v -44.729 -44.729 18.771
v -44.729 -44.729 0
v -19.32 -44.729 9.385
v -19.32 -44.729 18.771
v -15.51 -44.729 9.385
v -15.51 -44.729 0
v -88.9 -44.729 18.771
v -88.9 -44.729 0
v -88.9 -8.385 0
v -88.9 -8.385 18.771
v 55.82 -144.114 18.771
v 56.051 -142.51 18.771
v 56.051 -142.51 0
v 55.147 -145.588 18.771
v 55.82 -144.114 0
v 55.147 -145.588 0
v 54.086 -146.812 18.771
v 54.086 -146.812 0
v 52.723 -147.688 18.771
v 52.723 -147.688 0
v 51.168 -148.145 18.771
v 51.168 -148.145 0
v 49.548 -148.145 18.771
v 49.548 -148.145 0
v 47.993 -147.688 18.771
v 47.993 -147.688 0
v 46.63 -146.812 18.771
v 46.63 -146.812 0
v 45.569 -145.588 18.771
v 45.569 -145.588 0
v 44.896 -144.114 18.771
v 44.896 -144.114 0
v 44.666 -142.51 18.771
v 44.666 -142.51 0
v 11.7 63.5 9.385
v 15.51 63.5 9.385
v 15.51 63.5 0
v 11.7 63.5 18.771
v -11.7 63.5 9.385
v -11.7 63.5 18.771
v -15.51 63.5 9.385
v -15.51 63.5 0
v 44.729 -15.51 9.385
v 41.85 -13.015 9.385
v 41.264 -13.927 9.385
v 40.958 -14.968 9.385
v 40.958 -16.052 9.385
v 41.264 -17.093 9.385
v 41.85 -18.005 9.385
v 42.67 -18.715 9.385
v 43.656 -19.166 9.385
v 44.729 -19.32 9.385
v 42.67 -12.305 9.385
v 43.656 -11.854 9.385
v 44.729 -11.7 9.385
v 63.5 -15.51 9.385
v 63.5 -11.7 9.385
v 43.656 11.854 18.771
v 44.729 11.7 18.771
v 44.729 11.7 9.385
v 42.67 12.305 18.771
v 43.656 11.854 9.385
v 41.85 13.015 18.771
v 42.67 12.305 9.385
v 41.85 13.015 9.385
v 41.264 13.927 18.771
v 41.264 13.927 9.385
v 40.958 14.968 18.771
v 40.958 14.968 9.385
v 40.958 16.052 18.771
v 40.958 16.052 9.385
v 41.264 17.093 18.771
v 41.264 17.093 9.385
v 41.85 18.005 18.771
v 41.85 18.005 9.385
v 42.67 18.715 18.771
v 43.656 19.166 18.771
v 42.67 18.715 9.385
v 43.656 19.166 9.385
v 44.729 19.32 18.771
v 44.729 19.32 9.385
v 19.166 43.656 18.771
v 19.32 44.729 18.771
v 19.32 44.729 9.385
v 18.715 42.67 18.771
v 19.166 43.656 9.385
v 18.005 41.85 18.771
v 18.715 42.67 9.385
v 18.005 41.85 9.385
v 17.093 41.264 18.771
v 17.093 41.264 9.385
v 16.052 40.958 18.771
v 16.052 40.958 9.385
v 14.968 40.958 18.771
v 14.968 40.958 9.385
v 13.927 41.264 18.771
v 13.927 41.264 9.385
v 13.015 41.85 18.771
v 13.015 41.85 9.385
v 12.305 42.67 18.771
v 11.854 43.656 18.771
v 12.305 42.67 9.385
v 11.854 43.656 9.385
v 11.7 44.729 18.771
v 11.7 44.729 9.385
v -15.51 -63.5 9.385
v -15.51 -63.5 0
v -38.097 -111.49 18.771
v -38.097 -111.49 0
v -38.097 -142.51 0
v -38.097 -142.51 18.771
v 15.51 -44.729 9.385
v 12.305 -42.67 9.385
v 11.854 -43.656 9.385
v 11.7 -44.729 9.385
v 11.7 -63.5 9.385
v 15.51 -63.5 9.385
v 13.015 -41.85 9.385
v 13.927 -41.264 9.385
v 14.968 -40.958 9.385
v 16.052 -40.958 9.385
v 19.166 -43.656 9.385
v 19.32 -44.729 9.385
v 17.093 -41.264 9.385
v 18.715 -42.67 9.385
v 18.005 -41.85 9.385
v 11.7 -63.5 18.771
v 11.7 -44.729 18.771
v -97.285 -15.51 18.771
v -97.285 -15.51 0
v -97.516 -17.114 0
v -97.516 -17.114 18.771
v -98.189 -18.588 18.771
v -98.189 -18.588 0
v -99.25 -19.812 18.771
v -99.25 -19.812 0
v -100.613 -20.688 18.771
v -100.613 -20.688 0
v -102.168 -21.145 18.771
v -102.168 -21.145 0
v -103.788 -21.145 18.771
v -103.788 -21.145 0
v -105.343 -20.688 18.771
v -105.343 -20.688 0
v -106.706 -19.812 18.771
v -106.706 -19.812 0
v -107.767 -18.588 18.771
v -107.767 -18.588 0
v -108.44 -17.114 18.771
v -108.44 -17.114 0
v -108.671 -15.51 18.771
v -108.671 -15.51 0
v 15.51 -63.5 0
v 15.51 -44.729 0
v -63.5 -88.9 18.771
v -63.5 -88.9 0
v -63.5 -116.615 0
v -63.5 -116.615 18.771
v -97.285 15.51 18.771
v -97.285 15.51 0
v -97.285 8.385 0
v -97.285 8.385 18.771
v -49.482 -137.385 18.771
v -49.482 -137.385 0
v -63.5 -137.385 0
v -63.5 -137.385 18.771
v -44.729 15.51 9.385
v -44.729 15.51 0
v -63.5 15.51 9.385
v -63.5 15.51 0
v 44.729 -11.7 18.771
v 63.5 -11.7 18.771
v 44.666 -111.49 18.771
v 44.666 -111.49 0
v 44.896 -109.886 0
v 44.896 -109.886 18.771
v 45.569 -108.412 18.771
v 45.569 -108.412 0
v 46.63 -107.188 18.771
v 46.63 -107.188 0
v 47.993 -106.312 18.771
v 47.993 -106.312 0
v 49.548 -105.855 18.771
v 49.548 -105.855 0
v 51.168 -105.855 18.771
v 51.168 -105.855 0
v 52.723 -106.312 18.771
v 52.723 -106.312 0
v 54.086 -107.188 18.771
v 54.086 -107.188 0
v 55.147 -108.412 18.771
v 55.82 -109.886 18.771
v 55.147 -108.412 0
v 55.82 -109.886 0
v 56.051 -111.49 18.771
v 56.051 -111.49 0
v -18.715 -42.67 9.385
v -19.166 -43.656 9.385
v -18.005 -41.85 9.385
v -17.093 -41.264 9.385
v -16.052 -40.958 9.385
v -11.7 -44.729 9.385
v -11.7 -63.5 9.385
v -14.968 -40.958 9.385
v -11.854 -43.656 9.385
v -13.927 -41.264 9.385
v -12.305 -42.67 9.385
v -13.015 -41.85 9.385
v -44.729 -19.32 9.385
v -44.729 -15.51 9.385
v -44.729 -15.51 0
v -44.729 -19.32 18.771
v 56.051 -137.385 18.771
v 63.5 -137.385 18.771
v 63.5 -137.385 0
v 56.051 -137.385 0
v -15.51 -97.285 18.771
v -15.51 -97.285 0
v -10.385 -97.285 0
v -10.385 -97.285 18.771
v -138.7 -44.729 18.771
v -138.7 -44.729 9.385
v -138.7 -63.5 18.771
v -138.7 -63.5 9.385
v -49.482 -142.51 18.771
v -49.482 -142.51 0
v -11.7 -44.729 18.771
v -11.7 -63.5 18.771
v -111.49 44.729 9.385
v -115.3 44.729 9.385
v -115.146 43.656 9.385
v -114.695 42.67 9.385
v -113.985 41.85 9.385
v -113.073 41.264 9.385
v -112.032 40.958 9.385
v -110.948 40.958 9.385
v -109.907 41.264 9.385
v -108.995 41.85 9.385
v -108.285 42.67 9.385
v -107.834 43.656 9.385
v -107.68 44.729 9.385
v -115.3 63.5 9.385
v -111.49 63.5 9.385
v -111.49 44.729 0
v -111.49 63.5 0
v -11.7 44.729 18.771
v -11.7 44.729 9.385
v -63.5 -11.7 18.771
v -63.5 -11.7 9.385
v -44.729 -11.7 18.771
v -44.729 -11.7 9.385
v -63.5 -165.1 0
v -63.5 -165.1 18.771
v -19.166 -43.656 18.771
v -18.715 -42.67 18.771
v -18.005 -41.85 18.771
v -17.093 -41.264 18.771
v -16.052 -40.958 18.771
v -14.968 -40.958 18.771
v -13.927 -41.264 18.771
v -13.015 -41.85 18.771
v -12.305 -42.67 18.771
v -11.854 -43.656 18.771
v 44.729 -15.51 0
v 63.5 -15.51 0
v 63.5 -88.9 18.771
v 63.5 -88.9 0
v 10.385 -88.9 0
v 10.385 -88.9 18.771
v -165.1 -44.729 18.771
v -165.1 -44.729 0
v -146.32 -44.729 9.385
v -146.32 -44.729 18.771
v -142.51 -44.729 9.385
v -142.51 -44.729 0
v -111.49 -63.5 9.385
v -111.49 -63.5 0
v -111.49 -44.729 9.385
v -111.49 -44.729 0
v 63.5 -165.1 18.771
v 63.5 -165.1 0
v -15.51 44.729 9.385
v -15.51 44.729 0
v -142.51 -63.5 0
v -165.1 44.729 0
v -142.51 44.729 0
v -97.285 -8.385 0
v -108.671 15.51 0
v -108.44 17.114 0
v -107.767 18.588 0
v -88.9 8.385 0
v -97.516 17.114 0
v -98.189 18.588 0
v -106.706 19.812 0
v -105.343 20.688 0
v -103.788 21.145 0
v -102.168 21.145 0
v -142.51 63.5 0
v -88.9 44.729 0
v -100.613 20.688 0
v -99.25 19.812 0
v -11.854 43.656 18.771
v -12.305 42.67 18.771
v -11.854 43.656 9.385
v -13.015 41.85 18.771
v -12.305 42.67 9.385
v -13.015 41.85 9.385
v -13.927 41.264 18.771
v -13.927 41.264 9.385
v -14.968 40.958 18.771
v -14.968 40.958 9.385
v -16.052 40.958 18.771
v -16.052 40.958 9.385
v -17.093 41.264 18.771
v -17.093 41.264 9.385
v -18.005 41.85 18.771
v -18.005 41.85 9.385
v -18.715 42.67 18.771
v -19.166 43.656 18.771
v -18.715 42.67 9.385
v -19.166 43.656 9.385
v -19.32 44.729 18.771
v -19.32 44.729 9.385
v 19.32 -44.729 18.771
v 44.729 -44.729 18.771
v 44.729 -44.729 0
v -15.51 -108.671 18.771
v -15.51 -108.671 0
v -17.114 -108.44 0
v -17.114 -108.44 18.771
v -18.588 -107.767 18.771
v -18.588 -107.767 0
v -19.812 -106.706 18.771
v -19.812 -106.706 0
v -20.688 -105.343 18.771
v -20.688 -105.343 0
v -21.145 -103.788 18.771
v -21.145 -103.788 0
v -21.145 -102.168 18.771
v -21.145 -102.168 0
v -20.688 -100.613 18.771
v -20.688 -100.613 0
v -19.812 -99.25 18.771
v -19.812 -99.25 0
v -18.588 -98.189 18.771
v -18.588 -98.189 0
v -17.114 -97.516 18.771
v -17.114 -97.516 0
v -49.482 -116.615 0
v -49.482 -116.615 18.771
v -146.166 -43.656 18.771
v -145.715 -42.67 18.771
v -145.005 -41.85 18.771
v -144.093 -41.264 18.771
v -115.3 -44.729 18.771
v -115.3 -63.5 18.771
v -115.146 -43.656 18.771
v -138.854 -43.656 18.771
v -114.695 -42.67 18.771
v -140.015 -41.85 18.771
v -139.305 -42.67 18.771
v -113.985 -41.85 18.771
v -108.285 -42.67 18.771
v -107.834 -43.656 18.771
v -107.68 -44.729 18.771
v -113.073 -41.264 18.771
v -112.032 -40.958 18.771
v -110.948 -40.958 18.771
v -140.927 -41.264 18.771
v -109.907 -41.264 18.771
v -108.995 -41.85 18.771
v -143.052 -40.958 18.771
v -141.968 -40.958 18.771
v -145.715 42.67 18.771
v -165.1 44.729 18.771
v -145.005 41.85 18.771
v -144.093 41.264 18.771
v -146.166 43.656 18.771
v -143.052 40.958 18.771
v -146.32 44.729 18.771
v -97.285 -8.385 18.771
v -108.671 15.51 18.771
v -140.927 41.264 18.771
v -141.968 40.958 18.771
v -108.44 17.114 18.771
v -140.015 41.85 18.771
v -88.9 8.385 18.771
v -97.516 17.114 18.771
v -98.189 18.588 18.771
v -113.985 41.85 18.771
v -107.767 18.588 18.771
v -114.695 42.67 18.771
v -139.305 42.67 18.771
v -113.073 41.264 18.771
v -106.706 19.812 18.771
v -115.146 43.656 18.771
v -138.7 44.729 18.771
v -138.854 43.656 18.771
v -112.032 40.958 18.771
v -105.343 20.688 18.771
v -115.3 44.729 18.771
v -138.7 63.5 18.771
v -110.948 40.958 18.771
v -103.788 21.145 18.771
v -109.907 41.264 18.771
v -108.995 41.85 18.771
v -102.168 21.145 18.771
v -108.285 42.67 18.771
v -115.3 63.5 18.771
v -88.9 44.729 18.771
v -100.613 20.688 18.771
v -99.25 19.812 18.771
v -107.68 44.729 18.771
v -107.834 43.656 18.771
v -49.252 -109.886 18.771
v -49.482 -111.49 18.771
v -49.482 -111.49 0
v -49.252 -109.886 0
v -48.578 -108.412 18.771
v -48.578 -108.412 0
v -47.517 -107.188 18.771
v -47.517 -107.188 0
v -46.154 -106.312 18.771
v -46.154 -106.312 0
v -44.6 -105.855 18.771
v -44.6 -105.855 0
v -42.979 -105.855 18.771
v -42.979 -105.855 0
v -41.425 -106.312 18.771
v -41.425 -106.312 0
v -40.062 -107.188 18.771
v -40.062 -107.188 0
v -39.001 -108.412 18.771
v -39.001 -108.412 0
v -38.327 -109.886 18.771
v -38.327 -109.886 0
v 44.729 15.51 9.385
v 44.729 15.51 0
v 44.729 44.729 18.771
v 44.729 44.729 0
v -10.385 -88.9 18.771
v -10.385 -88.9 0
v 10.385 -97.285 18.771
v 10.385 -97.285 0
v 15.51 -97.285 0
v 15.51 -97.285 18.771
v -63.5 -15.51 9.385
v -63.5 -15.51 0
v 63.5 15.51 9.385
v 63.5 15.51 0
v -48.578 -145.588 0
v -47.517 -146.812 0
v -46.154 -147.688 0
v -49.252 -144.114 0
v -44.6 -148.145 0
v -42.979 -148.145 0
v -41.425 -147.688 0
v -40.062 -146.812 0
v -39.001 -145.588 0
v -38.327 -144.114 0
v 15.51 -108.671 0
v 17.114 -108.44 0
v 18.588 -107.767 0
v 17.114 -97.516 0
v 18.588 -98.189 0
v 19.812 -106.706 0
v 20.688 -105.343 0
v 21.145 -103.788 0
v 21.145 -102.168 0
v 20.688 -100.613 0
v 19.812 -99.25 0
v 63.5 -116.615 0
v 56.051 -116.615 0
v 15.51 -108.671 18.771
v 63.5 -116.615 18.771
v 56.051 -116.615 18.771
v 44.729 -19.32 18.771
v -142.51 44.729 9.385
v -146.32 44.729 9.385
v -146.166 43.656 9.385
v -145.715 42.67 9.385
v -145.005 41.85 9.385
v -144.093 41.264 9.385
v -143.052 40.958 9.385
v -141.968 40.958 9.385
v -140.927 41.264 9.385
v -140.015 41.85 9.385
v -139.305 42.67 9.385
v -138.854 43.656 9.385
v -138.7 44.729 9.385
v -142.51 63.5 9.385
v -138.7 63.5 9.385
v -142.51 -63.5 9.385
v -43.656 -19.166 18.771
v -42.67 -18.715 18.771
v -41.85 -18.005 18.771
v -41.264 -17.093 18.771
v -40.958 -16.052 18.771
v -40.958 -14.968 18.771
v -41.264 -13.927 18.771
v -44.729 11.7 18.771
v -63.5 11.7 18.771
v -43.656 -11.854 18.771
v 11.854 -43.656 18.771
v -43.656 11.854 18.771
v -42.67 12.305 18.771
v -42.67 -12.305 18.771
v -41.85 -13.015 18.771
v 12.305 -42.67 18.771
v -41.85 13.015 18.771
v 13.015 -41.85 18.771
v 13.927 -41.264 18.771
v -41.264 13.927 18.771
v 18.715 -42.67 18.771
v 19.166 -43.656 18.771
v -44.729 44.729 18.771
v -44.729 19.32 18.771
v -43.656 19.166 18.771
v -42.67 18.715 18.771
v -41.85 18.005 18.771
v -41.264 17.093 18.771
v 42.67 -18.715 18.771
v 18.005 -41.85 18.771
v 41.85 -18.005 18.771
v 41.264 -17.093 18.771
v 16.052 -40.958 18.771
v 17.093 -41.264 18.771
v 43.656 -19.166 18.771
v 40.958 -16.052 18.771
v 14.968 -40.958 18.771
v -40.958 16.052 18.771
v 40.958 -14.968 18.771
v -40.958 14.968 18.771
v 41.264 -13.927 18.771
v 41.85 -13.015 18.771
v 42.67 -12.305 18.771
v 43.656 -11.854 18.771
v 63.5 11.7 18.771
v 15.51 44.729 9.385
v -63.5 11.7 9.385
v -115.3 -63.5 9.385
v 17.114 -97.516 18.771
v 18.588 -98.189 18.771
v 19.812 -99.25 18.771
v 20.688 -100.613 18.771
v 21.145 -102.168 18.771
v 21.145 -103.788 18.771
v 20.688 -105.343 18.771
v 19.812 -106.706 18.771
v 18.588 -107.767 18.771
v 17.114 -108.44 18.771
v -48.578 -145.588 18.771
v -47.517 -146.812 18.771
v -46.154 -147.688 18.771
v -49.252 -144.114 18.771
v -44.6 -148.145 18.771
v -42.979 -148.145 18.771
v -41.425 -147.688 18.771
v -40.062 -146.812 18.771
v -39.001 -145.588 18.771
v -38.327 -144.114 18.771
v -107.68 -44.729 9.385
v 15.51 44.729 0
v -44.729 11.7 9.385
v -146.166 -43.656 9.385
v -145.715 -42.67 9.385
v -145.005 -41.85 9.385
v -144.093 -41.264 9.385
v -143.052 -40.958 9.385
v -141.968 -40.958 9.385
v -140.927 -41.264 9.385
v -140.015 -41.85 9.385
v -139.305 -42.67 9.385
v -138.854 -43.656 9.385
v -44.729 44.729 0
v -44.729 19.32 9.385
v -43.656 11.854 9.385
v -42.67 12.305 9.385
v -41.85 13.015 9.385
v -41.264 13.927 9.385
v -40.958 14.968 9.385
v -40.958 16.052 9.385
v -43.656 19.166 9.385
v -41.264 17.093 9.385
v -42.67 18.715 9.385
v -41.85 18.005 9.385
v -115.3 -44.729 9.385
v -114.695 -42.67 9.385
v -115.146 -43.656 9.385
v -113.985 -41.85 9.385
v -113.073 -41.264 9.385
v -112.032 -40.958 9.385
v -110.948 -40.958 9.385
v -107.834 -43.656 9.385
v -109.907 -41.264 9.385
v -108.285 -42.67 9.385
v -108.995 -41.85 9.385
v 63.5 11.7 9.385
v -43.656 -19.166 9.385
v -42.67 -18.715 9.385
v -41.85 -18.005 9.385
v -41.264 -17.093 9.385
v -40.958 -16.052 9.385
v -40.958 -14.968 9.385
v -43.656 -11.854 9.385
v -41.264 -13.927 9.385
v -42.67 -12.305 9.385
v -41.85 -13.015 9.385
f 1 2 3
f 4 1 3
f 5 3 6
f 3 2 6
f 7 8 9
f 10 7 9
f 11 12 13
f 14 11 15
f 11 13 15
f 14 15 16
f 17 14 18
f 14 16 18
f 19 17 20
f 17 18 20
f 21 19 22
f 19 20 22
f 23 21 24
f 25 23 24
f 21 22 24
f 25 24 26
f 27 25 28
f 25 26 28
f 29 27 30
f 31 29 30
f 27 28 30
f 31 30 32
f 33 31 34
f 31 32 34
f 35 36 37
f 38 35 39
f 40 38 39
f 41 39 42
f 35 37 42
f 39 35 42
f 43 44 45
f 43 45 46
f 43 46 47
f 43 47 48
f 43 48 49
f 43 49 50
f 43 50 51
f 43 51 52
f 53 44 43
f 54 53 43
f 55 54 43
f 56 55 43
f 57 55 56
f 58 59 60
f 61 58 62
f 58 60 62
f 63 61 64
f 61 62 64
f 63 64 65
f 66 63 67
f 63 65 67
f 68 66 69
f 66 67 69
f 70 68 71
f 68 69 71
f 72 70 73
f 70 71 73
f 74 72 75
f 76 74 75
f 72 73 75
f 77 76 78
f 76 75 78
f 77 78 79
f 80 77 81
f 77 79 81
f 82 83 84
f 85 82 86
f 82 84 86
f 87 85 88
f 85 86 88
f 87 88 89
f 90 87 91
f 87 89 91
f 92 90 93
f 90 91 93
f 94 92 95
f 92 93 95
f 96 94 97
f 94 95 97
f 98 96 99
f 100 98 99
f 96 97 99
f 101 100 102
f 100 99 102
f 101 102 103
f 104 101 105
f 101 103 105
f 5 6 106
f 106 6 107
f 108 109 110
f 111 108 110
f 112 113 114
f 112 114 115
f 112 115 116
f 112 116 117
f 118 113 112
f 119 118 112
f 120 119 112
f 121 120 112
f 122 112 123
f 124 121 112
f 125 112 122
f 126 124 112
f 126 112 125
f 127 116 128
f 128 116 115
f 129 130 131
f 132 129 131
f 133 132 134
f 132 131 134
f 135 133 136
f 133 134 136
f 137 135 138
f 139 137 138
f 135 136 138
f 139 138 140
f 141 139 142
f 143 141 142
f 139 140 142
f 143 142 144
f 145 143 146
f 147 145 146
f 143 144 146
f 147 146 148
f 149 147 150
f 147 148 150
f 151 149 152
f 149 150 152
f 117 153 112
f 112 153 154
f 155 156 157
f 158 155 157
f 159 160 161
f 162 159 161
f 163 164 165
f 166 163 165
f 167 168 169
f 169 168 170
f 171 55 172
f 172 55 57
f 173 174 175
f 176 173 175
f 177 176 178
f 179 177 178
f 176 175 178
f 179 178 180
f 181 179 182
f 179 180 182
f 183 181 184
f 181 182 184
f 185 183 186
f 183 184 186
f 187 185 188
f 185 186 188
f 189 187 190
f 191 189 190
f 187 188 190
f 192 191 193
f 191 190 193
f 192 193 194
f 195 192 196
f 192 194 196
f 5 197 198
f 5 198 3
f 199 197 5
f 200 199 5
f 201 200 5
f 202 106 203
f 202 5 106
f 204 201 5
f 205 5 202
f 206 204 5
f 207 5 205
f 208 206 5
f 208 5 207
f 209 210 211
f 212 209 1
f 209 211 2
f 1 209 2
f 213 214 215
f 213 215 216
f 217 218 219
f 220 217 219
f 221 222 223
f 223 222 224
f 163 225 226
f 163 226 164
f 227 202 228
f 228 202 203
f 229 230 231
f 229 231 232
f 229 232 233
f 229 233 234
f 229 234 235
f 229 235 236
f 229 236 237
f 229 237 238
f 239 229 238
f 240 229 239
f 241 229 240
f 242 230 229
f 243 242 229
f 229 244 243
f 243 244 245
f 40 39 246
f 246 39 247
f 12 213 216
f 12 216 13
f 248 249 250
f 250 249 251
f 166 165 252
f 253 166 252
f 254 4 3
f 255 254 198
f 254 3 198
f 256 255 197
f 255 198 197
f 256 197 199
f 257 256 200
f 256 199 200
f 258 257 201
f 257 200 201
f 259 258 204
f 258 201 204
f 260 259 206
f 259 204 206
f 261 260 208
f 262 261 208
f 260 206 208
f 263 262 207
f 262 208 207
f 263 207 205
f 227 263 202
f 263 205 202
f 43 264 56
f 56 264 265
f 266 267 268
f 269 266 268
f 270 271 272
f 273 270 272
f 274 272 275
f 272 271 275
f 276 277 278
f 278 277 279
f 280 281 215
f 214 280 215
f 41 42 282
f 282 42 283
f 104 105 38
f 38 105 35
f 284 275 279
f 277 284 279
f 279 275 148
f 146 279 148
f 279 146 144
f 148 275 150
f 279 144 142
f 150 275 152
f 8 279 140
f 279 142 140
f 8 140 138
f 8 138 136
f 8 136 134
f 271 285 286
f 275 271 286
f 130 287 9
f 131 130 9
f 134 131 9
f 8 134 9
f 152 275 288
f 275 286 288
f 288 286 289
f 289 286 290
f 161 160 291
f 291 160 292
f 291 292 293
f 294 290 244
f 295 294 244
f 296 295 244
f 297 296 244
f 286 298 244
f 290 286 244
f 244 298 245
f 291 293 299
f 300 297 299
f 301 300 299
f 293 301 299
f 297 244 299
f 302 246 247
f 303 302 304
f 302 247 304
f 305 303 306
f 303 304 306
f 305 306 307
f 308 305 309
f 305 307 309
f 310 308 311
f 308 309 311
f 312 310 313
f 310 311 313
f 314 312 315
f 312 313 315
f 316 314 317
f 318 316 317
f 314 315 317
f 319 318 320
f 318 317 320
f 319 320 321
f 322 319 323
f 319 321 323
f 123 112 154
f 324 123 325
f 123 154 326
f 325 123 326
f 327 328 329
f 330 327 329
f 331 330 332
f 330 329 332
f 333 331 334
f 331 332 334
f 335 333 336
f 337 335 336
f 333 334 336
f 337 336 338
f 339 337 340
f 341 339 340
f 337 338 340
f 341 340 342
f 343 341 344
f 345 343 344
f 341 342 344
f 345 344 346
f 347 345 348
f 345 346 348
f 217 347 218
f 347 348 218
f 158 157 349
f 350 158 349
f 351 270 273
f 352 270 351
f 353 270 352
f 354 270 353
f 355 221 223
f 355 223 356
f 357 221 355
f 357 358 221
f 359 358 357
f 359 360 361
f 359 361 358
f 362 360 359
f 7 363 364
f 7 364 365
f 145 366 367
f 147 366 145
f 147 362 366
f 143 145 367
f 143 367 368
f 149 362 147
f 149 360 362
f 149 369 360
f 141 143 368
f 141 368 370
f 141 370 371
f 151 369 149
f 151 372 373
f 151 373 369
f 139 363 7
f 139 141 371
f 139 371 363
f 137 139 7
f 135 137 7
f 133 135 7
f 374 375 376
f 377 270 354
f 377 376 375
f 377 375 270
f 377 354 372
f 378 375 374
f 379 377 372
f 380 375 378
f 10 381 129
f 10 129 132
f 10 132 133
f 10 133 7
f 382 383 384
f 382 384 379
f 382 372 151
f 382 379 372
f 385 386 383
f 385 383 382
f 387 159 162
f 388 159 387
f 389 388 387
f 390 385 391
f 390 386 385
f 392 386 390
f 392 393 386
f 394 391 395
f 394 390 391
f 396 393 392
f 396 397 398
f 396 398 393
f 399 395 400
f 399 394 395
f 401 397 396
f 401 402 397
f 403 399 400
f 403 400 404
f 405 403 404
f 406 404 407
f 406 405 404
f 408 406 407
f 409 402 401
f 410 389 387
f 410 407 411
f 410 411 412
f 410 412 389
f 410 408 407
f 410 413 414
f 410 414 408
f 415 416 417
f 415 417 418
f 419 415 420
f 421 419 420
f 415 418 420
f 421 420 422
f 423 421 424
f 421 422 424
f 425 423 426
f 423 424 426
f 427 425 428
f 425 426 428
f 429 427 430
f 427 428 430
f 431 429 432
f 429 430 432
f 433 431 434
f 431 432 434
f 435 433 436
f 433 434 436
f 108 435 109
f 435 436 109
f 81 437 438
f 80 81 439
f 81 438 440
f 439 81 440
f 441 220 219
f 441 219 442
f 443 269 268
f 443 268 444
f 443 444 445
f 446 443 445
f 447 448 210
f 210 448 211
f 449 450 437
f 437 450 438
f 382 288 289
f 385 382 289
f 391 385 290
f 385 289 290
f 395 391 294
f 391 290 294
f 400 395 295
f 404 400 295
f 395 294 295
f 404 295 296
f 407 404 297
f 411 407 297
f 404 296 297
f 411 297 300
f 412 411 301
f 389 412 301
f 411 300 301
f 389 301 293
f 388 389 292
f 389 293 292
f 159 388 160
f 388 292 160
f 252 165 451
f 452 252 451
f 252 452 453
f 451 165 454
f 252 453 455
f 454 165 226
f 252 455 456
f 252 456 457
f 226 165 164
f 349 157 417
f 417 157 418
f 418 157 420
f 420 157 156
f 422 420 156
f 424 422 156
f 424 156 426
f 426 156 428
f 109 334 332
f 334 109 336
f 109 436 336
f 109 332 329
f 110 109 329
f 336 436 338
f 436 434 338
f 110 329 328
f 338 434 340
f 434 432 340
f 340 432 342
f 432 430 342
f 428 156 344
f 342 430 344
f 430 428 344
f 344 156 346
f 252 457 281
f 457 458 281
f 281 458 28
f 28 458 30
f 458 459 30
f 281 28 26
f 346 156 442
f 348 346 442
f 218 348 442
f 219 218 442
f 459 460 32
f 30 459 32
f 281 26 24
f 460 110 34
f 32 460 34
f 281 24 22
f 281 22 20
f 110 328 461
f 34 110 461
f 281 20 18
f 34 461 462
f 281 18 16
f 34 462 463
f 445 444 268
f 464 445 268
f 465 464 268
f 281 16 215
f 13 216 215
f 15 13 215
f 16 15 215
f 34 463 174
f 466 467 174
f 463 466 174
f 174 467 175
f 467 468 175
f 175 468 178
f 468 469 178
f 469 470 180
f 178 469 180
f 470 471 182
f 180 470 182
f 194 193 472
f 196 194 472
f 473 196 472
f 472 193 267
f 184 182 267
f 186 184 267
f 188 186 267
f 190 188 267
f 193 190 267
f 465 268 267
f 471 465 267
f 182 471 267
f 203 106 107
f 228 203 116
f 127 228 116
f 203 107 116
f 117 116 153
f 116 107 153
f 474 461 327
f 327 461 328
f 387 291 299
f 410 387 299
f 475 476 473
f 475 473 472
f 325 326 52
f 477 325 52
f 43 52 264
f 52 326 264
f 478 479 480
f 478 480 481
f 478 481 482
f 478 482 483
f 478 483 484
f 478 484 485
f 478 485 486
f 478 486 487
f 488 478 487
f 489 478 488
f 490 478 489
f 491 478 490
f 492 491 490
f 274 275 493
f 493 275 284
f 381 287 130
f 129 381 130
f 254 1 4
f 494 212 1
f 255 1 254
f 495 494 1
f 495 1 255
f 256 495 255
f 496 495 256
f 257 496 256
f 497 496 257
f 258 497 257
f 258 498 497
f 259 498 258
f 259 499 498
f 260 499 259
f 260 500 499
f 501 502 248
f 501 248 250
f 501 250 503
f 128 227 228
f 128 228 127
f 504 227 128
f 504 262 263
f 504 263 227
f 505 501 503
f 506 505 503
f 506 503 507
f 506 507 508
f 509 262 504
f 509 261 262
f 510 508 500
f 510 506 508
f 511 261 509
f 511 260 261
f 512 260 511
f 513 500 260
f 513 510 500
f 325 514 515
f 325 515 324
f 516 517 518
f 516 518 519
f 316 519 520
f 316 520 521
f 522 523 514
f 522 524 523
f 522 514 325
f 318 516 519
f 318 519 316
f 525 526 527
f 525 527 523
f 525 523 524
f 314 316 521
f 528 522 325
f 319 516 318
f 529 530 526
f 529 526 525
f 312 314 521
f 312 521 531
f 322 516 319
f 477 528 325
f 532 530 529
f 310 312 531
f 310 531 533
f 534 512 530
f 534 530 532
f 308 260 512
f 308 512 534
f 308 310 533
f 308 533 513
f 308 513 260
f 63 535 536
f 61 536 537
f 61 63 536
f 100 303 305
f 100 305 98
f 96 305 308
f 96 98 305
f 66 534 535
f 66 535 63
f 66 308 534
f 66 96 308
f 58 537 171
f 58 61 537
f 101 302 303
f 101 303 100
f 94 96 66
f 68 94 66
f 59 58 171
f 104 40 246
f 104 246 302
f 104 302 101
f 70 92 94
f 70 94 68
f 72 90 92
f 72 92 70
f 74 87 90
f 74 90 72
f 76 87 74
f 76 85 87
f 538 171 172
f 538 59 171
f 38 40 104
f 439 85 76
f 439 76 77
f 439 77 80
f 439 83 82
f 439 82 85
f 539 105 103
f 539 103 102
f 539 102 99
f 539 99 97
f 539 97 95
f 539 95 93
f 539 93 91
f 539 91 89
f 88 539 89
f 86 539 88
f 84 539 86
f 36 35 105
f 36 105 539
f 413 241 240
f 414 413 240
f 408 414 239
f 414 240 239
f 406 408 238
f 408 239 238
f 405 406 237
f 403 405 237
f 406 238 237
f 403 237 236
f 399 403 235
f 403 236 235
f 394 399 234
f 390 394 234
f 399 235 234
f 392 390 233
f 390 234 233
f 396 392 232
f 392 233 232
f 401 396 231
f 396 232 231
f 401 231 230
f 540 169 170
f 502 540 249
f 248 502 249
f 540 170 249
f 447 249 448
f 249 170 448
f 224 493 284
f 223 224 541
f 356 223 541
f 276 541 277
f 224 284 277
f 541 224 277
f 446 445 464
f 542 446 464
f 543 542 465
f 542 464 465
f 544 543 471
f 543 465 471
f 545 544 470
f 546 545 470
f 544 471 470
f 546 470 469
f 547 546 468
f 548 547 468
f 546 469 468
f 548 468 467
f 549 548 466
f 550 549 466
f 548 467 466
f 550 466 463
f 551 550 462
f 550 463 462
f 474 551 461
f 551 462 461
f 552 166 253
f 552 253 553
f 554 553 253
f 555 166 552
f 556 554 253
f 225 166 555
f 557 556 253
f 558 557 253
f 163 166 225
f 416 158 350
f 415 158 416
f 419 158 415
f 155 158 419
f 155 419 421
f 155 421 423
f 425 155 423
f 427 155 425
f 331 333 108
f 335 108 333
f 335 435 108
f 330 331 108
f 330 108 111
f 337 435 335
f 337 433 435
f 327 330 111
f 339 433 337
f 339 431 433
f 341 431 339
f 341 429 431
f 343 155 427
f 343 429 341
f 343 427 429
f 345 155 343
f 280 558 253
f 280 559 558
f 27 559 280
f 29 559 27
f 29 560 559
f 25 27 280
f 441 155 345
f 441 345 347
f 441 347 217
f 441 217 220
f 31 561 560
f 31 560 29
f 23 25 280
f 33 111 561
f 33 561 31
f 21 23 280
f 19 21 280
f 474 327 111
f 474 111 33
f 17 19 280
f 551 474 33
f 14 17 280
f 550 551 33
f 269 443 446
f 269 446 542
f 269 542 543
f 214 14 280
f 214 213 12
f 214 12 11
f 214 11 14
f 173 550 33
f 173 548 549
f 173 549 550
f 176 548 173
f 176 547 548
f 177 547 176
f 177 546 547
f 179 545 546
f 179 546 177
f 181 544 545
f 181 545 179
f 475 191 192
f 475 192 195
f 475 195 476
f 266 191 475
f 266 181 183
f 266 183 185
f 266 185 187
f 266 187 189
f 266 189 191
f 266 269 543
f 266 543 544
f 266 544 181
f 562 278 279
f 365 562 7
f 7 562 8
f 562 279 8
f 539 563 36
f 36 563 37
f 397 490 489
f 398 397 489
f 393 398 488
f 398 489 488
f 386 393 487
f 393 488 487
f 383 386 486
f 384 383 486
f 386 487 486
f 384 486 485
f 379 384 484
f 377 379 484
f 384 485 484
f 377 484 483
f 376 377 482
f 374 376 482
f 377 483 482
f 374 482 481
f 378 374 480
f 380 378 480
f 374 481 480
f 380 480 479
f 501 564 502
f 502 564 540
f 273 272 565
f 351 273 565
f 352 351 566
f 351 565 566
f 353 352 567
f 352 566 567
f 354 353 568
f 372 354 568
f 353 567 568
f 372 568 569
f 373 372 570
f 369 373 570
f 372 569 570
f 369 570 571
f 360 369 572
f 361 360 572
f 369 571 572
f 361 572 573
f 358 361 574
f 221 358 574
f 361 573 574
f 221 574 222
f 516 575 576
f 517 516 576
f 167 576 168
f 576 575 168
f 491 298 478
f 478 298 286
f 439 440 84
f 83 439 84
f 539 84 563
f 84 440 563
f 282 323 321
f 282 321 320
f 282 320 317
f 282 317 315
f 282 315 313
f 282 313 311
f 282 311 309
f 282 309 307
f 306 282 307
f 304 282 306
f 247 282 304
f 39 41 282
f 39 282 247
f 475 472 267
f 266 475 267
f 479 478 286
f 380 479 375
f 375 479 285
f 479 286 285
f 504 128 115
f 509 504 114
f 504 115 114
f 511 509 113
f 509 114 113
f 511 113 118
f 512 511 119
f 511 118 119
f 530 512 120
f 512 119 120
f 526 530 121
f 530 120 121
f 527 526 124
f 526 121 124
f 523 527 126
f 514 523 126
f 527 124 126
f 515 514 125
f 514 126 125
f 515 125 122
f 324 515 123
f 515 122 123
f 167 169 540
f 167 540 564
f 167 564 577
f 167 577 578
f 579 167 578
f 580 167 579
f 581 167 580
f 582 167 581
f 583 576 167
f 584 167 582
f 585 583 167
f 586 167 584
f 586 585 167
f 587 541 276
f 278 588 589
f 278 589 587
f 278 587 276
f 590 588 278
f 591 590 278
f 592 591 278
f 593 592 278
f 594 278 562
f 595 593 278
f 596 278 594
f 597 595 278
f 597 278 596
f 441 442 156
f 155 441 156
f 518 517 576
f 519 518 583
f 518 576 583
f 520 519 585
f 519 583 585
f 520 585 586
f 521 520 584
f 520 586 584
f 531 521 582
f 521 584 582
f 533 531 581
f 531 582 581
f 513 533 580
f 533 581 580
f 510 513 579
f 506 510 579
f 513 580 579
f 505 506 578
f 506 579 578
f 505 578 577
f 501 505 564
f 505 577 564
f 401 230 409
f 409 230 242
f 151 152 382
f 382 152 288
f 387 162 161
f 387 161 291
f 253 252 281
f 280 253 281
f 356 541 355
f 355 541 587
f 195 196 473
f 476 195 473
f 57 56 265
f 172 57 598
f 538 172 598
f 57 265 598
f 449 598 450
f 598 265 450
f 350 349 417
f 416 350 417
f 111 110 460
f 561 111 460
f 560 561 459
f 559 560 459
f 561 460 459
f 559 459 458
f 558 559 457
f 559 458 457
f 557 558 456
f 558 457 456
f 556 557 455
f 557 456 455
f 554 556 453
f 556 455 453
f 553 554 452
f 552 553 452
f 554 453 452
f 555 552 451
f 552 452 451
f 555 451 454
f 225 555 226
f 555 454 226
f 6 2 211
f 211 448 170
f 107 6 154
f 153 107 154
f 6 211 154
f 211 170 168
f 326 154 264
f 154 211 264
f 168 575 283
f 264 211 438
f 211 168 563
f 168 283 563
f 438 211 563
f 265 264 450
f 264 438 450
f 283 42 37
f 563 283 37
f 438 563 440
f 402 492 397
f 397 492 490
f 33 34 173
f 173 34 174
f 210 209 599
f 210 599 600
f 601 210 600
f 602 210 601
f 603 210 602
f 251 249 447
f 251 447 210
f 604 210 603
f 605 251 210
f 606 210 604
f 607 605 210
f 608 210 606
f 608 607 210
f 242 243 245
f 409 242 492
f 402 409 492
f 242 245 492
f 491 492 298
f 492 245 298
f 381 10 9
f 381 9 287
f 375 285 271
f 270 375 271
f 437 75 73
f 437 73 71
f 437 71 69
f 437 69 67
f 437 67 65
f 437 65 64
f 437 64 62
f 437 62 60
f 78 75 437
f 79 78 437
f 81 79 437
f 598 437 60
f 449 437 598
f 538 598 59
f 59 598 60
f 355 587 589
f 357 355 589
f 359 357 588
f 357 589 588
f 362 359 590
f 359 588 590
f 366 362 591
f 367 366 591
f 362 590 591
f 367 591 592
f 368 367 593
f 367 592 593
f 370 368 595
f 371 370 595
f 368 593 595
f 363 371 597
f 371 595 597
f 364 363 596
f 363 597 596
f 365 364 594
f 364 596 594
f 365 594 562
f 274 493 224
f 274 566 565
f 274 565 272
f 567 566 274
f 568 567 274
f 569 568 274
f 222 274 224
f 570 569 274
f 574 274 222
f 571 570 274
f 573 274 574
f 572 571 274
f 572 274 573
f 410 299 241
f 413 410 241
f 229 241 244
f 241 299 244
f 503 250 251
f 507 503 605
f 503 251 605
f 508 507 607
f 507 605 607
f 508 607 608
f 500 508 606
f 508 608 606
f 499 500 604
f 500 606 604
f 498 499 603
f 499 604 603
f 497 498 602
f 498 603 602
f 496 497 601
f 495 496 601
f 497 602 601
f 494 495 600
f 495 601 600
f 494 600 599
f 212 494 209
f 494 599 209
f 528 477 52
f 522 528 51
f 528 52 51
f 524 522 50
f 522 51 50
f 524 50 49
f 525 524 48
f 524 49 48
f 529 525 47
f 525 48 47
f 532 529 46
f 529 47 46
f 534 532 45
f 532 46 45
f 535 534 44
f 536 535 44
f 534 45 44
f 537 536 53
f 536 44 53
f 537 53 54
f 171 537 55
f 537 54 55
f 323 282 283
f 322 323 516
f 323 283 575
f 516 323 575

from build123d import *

# Parameters (mm, degrees)
F2_DEPTH = 18.7706
F3_DEPTH = 9.3853
F4_DEPTH = 18.7706
F5_DEPTH = 18.7706
F6_DEPTH = 9.3853


with BuildPart() as f2:
    # F1 (on Top) → F2 (new body)
    with BuildSketch(Plane.XY):
        with BuildLine():
            Line((19.32, -44.7294), (44.7294, -44.7294))
            Line((44.7294, -44.7294), (44.7294, -19.32))
            ThreePointArc((44.7294, -19.32), (40.9194, -15.51), (44.7294, -11.7))
            Line((44.7294, -11.7), (63.5, -11.7))
            Line((63.5, -11.7), (63.5, 11.7))
            Line((63.5, 11.7), (44.7294, 11.7))
            ThreePointArc((44.7294, 11.7), (40.9194, 15.51), (44.7294, 19.32))
            Line((44.7294, 19.32), (44.7294, 44.7294))
            Line((44.7294, 44.7294), (19.32, 44.7294))
            ThreePointArc((19.32, 44.7294), (15.51, 40.9194), (11.7, 44.7294))
            Line((11.7, 44.7294), (11.7, 63.5))
            Line((11.7, 63.5), (-11.7, 63.5))
            Line((-11.7, 63.5), (-11.7, 44.7294))
            ThreePointArc((-11.7, 44.7294), (-15.51, 40.9194), (-19.32, 44.7294))
            Line((-19.32, 44.7294), (-44.7294, 44.7294))
            Line((-44.7294, 44.7294), (-44.7294, 19.32))
            ThreePointArc((-44.7294, 19.32), (-40.9194, 15.51), (-44.7294, 11.7))
            Line((-44.7294, 11.7), (-63.5, 11.7))
            Line((-63.5, 11.7), (-63.5, -11.7))
            Line((-63.5, -11.7), (-44.7294, -11.7))
            ThreePointArc((-44.7294, -11.7), (-40.9194, -15.51), (-44.7294, -19.32))
            Line((-44.7294, -19.32), (-44.7294, -44.7294))
            Line((-44.7294, -44.7294), (-19.32, -44.7294))
            ThreePointArc((-19.32, -44.7294), (-15.51, -40.9194), (-11.7, -44.7294))
            Line((-11.7, -44.7294), (-11.7, -63.5))
            Line((-11.7, -63.5), (11.7, -63.5))
            Line((11.7, -63.5), (11.7, -44.7294))
            ThreePointArc((11.7, -44.7294), (15.51, -40.9194), (19.32, -44.7294))
        make_face()
    extrude(amount=F2_DEPTH)

    # F1 (on Top) → F3 (join)
    with BuildSketch(Plane.XY):
        with BuildLine():
            Line((-11.7, 44.7294), (-11.7, 63.5))
            Line((-11.7, 63.5), (-15.51, 63.5))
            Line((-15.51, 63.5), (-15.51, 44.7294))
            Line((-15.51, 44.7294), (-19.32, 44.7294))
            ThreePointArc((-19.32, 44.7294), (-15.51, 40.9194), (-11.7, 44.7294))
        make_face()
        with BuildLine():
            Line((-63.5, 15.51), (-63.5, 11.7))
            Line((-63.5, 11.7), (-44.7294, 11.7))
            ThreePointArc((-44.7294, 11.7), (-40.9194, 15.51), (-44.7294, 19.32))
            Line((-44.7294, 19.32), (-44.7294, 15.51))
            Line((-44.7294, 15.51), (-63.5, 15.51))
        make_face()
        with BuildLine():
            Line((-44.7294, -15.51), (-44.7294, -19.32))
            ThreePointArc((-44.7294, -19.32), (-40.9194, -15.51), (-44.7294, -11.7))
            Line((-44.7294, -11.7), (-63.5, -11.7))
            Line((-63.5, -11.7), (-63.5, -15.51))
            Line((-63.5, -15.51), (-44.7294, -15.51))
        make_face()
        with BuildLine():
            Line((-15.51, -63.5), (-11.7, -63.5))
            Line((-11.7, -63.5), (-11.7, -44.7294))
            ThreePointArc((-11.7, -44.7294), (-15.51, -40.9194), (-19.32, -44.7294))
            Line((-19.32, -44.7294), (-15.51, -44.7294))
            Line((-15.51, -44.7294), (-15.51, -63.5))
        make_face()
        with BuildLine():
            Line((15.51, -44.7294), (19.32, -44.7294))
            ThreePointArc((19.32, -44.7294), (15.51, -40.9194), (11.7, -44.7294))
            Line((11.7, -44.7294), (11.7, -63.5))
            Line((11.7, -63.5), (15.51, -63.5))
            Line((15.51, -63.5), (15.51, -44.7294))
        make_face()
        with BuildLine():
            ThreePointArc((44.7294, -11.7), (40.9194, -15.51), (44.7294, -19.32))
            Line((44.7294, -19.32), (44.7294, -15.51))
            Line((44.7294, -15.51), (63.5, -15.51))
            Line((63.5, -15.51), (63.5, -11.7))
            Line((63.5, -11.7), (44.7294, -11.7))
        make_face()
        with BuildLine():
            Line((44.7294, 11.7), (63.5, 11.7))
            Line((63.5, 11.7), (63.5, 15.51))
            Line((63.5, 15.51), (44.7294, 15.51))
            Line((44.7294, 15.51), (44.7294, 19.32))
            ThreePointArc((44.7294, 19.32), (40.9194, 15.51), (44.7294, 11.7))
        make_face()
        with BuildLine():
            ThreePointArc((11.7, 44.7294), (15.51, 40.9194), (19.32, 44.7294))
            Line((19.32, 44.7294), (15.51, 44.7294))
            Line((15.51, 44.7294), (15.51, 63.5))
            Line((15.51, 63.5), (11.7, 63.5))
            Line((11.7, 63.5), (11.7, 44.7294))
        make_face()
    extrude(amount=F3_DEPTH)


with BuildPart() as f4:
    # F1 (on Top) → F4 (new body)
    with BuildSketch(Plane.XY):
        with BuildLine():
            Line((-63.5, -137.3853), (-63.5, -165.1))
            Line((-63.5, -165.1), (63.5, -165.1))
            Line((63.5, -165.1), (63.5, -137.3853))
            Line((63.5, -137.3853), (56.0508503042, -137.3853))
            Line((56.0508503042, -137.3853), (56.0508503042, -142.51))
            ThreePointArc((56.0508503042, -142.51), (50.3582003042, -148.20265), (44.6655503042, -142.51))
            Line((44.6655503042, -142.51), (44.6655503042, -111.49))
            ThreePointArc((44.6655503042, -111.49), (50.3582003042, -105.79735), (56.0508503042, -111.49))
            Line((56.0508503042, -111.49), (56.0508503042, -116.6147))
            Line((56.0508503042, -116.6147), (63.5, -116.6147))
            Line((63.5, -116.6147), (63.5, -88.9))
            Line((63.5, -88.9), (10.3853, -88.9))
            Line((10.3853, -88.9), (10.3853, -97.2853))
            Line((10.3853, -97.2853), (15.51, -97.2853))
            ThreePointArc((15.51, -97.2853), (21.20265, -102.97795), (15.51, -108.6706))
            Line((15.51, -108.6706), (-15.51, -108.6706))
            ThreePointArc((-15.51, -108.6706), (-21.20265, -102.97795), (-15.51, -97.2853))
            Line((-15.51, -97.2853), (-10.3853, -97.2853))
            Line((-10.3853, -97.2853), (-10.3853, -88.9))
            Line((-10.3853, -88.9), (-63.5, -88.9))
            Line((-63.5, -88.9), (-63.5, -116.6147))
            Line((-63.5, -116.6147), (-49.4821332395, -116.6147))
            Line((-49.4821332395, -116.6147), (-49.4821332395, -111.49))
            ThreePointArc((-49.4821332395, -111.49), (-43.7894832395, -105.79735), (-38.0968332395, -111.49))
            Line((-38.0968332395, -111.49), (-38.0968332395, -142.51))
            ThreePointArc((-38.0968332395, -142.51), (-43.7894832395, -148.20265), (-49.4821332395, -142.51))
            Line((-49.4821332395, -142.51), (-49.4821332395, -137.3853))
            Line((-49.4821332395, -137.3853), (-63.5, -137.3853))
        make_face()
    extrude(amount=F4_DEPTH)


with BuildPart() as f5:
    # F1 (on Top) → F5 (new body)
    with BuildSketch(Plane.XY):
        with BuildLine():
            Line((-107.68, -44.7294), (-88.9, -44.7294))
            Line((-88.9, -44.7294), (-88.9, -8.3853))
            Line((-88.9, -8.3853), (-97.2853, -8.3853))
            Line((-97.2853, -8.3853), (-97.2853, -15.51))
            ThreePointArc((-97.2853, -15.51), (-102.97795, -21.20265), (-108.6706, -15.51))
            Line((-108.6706, -15.51), (-108.6706, 15.51))
            ThreePointArc((-108.6706, 15.51), (-102.97795, 21.20265), (-97.2853, 15.51))
            Line((-97.2853, 15.51), (-97.2853, 8.3853))
            Line((-97.2853, 8.3853), (-88.9, 8.3853))
            Line((-88.9, 8.3853), (-88.9, 44.7294))
            Line((-88.9, 44.7294), (-107.68, 44.7294))
            ThreePointArc((-107.68, 44.7294), (-111.49, 40.9194), (-115.3, 44.7294))
            Line((-115.3, 44.7294), (-115.3, 63.5))
            Line((-115.3, 63.5), (-138.7, 63.5))
            Line((-138.7, 63.5), (-138.7, 44.7294))
            ThreePointArc((-138.7, 44.7294), (-142.51, 40.9194), (-146.32, 44.7294))
            Line((-146.32, 44.7294), (-165.1, 44.7294))
            Line((-165.1, 44.7294), (-165.1, -44.7294))
            Line((-165.1, -44.7294), (-146.32, -44.7294))
            ThreePointArc((-146.32, -44.7294), (-142.51, -40.9194), (-138.7, -44.7294))
            Line((-138.7, -44.7294), (-138.7, -63.5))
            Line((-138.7, -63.5), (-115.3, -63.5))
            Line((-115.3, -63.5), (-115.3, -44.7294))
            ThreePointArc((-115.3, -44.7294), (-111.49, -40.9194), (-107.68, -44.7294))
        make_face()
    extrude(amount=F5_DEPTH)

    # F1 (on Top) → F6 (join)
    with BuildSketch(Plane.XY):
        with BuildLine():
            Line((-142.51, 44.7294), (-146.32, 44.7294))
            ThreePointArc((-146.32, 44.7294), (-142.51, 40.9194), (-138.7, 44.7294))
            Line((-138.7, 44.7294), (-138.7, 63.5))
            Line((-138.7, 63.5), (-142.51, 63.5))
            Line((-142.51, 63.5), (-142.51, 44.7294))
        make_face()
        with BuildLine():
            ThreePointArc((-115.3, 44.7294), (-111.49, 40.9194), (-107.68, 44.7294))
            Line((-107.68, 44.7294), (-111.49, 44.7294))
            Line((-111.49, 44.7294), (-111.49, 63.5))
            Line((-111.49, 63.5), (-115.3, 63.5))
            Line((-115.3, 63.5), (-115.3, 44.7294))
        make_face()
        with BuildLine():
            Line((-111.49, -44.7294), (-107.68, -44.7294))
            ThreePointArc((-107.68, -44.7294), (-111.49, -40.9194), (-115.3, -44.7294))
            Line((-115.3, -44.7294), (-115.3, -63.5))
            Line((-115.3, -63.5), (-111.49, -63.5))
            Line((-111.49, -63.5), (-111.49, -44.7294))
        make_face()
        with BuildLine():
            Line((-142.51, -63.5), (-138.7, -63.5))
            Line((-138.7, -63.5), (-138.7, -44.7294))
            ThreePointArc((-138.7, -44.7294), (-142.51, -40.9194), (-146.32, -44.7294))
            Line((-146.32, -44.7294), (-142.51, -44.7294))
            Line((-142.51, -44.7294), (-142.51, -63.5))
        make_face()
    extrude(amount=F6_DEPTH)


solid = Compound([f2.part, f4.part, f5.part])
